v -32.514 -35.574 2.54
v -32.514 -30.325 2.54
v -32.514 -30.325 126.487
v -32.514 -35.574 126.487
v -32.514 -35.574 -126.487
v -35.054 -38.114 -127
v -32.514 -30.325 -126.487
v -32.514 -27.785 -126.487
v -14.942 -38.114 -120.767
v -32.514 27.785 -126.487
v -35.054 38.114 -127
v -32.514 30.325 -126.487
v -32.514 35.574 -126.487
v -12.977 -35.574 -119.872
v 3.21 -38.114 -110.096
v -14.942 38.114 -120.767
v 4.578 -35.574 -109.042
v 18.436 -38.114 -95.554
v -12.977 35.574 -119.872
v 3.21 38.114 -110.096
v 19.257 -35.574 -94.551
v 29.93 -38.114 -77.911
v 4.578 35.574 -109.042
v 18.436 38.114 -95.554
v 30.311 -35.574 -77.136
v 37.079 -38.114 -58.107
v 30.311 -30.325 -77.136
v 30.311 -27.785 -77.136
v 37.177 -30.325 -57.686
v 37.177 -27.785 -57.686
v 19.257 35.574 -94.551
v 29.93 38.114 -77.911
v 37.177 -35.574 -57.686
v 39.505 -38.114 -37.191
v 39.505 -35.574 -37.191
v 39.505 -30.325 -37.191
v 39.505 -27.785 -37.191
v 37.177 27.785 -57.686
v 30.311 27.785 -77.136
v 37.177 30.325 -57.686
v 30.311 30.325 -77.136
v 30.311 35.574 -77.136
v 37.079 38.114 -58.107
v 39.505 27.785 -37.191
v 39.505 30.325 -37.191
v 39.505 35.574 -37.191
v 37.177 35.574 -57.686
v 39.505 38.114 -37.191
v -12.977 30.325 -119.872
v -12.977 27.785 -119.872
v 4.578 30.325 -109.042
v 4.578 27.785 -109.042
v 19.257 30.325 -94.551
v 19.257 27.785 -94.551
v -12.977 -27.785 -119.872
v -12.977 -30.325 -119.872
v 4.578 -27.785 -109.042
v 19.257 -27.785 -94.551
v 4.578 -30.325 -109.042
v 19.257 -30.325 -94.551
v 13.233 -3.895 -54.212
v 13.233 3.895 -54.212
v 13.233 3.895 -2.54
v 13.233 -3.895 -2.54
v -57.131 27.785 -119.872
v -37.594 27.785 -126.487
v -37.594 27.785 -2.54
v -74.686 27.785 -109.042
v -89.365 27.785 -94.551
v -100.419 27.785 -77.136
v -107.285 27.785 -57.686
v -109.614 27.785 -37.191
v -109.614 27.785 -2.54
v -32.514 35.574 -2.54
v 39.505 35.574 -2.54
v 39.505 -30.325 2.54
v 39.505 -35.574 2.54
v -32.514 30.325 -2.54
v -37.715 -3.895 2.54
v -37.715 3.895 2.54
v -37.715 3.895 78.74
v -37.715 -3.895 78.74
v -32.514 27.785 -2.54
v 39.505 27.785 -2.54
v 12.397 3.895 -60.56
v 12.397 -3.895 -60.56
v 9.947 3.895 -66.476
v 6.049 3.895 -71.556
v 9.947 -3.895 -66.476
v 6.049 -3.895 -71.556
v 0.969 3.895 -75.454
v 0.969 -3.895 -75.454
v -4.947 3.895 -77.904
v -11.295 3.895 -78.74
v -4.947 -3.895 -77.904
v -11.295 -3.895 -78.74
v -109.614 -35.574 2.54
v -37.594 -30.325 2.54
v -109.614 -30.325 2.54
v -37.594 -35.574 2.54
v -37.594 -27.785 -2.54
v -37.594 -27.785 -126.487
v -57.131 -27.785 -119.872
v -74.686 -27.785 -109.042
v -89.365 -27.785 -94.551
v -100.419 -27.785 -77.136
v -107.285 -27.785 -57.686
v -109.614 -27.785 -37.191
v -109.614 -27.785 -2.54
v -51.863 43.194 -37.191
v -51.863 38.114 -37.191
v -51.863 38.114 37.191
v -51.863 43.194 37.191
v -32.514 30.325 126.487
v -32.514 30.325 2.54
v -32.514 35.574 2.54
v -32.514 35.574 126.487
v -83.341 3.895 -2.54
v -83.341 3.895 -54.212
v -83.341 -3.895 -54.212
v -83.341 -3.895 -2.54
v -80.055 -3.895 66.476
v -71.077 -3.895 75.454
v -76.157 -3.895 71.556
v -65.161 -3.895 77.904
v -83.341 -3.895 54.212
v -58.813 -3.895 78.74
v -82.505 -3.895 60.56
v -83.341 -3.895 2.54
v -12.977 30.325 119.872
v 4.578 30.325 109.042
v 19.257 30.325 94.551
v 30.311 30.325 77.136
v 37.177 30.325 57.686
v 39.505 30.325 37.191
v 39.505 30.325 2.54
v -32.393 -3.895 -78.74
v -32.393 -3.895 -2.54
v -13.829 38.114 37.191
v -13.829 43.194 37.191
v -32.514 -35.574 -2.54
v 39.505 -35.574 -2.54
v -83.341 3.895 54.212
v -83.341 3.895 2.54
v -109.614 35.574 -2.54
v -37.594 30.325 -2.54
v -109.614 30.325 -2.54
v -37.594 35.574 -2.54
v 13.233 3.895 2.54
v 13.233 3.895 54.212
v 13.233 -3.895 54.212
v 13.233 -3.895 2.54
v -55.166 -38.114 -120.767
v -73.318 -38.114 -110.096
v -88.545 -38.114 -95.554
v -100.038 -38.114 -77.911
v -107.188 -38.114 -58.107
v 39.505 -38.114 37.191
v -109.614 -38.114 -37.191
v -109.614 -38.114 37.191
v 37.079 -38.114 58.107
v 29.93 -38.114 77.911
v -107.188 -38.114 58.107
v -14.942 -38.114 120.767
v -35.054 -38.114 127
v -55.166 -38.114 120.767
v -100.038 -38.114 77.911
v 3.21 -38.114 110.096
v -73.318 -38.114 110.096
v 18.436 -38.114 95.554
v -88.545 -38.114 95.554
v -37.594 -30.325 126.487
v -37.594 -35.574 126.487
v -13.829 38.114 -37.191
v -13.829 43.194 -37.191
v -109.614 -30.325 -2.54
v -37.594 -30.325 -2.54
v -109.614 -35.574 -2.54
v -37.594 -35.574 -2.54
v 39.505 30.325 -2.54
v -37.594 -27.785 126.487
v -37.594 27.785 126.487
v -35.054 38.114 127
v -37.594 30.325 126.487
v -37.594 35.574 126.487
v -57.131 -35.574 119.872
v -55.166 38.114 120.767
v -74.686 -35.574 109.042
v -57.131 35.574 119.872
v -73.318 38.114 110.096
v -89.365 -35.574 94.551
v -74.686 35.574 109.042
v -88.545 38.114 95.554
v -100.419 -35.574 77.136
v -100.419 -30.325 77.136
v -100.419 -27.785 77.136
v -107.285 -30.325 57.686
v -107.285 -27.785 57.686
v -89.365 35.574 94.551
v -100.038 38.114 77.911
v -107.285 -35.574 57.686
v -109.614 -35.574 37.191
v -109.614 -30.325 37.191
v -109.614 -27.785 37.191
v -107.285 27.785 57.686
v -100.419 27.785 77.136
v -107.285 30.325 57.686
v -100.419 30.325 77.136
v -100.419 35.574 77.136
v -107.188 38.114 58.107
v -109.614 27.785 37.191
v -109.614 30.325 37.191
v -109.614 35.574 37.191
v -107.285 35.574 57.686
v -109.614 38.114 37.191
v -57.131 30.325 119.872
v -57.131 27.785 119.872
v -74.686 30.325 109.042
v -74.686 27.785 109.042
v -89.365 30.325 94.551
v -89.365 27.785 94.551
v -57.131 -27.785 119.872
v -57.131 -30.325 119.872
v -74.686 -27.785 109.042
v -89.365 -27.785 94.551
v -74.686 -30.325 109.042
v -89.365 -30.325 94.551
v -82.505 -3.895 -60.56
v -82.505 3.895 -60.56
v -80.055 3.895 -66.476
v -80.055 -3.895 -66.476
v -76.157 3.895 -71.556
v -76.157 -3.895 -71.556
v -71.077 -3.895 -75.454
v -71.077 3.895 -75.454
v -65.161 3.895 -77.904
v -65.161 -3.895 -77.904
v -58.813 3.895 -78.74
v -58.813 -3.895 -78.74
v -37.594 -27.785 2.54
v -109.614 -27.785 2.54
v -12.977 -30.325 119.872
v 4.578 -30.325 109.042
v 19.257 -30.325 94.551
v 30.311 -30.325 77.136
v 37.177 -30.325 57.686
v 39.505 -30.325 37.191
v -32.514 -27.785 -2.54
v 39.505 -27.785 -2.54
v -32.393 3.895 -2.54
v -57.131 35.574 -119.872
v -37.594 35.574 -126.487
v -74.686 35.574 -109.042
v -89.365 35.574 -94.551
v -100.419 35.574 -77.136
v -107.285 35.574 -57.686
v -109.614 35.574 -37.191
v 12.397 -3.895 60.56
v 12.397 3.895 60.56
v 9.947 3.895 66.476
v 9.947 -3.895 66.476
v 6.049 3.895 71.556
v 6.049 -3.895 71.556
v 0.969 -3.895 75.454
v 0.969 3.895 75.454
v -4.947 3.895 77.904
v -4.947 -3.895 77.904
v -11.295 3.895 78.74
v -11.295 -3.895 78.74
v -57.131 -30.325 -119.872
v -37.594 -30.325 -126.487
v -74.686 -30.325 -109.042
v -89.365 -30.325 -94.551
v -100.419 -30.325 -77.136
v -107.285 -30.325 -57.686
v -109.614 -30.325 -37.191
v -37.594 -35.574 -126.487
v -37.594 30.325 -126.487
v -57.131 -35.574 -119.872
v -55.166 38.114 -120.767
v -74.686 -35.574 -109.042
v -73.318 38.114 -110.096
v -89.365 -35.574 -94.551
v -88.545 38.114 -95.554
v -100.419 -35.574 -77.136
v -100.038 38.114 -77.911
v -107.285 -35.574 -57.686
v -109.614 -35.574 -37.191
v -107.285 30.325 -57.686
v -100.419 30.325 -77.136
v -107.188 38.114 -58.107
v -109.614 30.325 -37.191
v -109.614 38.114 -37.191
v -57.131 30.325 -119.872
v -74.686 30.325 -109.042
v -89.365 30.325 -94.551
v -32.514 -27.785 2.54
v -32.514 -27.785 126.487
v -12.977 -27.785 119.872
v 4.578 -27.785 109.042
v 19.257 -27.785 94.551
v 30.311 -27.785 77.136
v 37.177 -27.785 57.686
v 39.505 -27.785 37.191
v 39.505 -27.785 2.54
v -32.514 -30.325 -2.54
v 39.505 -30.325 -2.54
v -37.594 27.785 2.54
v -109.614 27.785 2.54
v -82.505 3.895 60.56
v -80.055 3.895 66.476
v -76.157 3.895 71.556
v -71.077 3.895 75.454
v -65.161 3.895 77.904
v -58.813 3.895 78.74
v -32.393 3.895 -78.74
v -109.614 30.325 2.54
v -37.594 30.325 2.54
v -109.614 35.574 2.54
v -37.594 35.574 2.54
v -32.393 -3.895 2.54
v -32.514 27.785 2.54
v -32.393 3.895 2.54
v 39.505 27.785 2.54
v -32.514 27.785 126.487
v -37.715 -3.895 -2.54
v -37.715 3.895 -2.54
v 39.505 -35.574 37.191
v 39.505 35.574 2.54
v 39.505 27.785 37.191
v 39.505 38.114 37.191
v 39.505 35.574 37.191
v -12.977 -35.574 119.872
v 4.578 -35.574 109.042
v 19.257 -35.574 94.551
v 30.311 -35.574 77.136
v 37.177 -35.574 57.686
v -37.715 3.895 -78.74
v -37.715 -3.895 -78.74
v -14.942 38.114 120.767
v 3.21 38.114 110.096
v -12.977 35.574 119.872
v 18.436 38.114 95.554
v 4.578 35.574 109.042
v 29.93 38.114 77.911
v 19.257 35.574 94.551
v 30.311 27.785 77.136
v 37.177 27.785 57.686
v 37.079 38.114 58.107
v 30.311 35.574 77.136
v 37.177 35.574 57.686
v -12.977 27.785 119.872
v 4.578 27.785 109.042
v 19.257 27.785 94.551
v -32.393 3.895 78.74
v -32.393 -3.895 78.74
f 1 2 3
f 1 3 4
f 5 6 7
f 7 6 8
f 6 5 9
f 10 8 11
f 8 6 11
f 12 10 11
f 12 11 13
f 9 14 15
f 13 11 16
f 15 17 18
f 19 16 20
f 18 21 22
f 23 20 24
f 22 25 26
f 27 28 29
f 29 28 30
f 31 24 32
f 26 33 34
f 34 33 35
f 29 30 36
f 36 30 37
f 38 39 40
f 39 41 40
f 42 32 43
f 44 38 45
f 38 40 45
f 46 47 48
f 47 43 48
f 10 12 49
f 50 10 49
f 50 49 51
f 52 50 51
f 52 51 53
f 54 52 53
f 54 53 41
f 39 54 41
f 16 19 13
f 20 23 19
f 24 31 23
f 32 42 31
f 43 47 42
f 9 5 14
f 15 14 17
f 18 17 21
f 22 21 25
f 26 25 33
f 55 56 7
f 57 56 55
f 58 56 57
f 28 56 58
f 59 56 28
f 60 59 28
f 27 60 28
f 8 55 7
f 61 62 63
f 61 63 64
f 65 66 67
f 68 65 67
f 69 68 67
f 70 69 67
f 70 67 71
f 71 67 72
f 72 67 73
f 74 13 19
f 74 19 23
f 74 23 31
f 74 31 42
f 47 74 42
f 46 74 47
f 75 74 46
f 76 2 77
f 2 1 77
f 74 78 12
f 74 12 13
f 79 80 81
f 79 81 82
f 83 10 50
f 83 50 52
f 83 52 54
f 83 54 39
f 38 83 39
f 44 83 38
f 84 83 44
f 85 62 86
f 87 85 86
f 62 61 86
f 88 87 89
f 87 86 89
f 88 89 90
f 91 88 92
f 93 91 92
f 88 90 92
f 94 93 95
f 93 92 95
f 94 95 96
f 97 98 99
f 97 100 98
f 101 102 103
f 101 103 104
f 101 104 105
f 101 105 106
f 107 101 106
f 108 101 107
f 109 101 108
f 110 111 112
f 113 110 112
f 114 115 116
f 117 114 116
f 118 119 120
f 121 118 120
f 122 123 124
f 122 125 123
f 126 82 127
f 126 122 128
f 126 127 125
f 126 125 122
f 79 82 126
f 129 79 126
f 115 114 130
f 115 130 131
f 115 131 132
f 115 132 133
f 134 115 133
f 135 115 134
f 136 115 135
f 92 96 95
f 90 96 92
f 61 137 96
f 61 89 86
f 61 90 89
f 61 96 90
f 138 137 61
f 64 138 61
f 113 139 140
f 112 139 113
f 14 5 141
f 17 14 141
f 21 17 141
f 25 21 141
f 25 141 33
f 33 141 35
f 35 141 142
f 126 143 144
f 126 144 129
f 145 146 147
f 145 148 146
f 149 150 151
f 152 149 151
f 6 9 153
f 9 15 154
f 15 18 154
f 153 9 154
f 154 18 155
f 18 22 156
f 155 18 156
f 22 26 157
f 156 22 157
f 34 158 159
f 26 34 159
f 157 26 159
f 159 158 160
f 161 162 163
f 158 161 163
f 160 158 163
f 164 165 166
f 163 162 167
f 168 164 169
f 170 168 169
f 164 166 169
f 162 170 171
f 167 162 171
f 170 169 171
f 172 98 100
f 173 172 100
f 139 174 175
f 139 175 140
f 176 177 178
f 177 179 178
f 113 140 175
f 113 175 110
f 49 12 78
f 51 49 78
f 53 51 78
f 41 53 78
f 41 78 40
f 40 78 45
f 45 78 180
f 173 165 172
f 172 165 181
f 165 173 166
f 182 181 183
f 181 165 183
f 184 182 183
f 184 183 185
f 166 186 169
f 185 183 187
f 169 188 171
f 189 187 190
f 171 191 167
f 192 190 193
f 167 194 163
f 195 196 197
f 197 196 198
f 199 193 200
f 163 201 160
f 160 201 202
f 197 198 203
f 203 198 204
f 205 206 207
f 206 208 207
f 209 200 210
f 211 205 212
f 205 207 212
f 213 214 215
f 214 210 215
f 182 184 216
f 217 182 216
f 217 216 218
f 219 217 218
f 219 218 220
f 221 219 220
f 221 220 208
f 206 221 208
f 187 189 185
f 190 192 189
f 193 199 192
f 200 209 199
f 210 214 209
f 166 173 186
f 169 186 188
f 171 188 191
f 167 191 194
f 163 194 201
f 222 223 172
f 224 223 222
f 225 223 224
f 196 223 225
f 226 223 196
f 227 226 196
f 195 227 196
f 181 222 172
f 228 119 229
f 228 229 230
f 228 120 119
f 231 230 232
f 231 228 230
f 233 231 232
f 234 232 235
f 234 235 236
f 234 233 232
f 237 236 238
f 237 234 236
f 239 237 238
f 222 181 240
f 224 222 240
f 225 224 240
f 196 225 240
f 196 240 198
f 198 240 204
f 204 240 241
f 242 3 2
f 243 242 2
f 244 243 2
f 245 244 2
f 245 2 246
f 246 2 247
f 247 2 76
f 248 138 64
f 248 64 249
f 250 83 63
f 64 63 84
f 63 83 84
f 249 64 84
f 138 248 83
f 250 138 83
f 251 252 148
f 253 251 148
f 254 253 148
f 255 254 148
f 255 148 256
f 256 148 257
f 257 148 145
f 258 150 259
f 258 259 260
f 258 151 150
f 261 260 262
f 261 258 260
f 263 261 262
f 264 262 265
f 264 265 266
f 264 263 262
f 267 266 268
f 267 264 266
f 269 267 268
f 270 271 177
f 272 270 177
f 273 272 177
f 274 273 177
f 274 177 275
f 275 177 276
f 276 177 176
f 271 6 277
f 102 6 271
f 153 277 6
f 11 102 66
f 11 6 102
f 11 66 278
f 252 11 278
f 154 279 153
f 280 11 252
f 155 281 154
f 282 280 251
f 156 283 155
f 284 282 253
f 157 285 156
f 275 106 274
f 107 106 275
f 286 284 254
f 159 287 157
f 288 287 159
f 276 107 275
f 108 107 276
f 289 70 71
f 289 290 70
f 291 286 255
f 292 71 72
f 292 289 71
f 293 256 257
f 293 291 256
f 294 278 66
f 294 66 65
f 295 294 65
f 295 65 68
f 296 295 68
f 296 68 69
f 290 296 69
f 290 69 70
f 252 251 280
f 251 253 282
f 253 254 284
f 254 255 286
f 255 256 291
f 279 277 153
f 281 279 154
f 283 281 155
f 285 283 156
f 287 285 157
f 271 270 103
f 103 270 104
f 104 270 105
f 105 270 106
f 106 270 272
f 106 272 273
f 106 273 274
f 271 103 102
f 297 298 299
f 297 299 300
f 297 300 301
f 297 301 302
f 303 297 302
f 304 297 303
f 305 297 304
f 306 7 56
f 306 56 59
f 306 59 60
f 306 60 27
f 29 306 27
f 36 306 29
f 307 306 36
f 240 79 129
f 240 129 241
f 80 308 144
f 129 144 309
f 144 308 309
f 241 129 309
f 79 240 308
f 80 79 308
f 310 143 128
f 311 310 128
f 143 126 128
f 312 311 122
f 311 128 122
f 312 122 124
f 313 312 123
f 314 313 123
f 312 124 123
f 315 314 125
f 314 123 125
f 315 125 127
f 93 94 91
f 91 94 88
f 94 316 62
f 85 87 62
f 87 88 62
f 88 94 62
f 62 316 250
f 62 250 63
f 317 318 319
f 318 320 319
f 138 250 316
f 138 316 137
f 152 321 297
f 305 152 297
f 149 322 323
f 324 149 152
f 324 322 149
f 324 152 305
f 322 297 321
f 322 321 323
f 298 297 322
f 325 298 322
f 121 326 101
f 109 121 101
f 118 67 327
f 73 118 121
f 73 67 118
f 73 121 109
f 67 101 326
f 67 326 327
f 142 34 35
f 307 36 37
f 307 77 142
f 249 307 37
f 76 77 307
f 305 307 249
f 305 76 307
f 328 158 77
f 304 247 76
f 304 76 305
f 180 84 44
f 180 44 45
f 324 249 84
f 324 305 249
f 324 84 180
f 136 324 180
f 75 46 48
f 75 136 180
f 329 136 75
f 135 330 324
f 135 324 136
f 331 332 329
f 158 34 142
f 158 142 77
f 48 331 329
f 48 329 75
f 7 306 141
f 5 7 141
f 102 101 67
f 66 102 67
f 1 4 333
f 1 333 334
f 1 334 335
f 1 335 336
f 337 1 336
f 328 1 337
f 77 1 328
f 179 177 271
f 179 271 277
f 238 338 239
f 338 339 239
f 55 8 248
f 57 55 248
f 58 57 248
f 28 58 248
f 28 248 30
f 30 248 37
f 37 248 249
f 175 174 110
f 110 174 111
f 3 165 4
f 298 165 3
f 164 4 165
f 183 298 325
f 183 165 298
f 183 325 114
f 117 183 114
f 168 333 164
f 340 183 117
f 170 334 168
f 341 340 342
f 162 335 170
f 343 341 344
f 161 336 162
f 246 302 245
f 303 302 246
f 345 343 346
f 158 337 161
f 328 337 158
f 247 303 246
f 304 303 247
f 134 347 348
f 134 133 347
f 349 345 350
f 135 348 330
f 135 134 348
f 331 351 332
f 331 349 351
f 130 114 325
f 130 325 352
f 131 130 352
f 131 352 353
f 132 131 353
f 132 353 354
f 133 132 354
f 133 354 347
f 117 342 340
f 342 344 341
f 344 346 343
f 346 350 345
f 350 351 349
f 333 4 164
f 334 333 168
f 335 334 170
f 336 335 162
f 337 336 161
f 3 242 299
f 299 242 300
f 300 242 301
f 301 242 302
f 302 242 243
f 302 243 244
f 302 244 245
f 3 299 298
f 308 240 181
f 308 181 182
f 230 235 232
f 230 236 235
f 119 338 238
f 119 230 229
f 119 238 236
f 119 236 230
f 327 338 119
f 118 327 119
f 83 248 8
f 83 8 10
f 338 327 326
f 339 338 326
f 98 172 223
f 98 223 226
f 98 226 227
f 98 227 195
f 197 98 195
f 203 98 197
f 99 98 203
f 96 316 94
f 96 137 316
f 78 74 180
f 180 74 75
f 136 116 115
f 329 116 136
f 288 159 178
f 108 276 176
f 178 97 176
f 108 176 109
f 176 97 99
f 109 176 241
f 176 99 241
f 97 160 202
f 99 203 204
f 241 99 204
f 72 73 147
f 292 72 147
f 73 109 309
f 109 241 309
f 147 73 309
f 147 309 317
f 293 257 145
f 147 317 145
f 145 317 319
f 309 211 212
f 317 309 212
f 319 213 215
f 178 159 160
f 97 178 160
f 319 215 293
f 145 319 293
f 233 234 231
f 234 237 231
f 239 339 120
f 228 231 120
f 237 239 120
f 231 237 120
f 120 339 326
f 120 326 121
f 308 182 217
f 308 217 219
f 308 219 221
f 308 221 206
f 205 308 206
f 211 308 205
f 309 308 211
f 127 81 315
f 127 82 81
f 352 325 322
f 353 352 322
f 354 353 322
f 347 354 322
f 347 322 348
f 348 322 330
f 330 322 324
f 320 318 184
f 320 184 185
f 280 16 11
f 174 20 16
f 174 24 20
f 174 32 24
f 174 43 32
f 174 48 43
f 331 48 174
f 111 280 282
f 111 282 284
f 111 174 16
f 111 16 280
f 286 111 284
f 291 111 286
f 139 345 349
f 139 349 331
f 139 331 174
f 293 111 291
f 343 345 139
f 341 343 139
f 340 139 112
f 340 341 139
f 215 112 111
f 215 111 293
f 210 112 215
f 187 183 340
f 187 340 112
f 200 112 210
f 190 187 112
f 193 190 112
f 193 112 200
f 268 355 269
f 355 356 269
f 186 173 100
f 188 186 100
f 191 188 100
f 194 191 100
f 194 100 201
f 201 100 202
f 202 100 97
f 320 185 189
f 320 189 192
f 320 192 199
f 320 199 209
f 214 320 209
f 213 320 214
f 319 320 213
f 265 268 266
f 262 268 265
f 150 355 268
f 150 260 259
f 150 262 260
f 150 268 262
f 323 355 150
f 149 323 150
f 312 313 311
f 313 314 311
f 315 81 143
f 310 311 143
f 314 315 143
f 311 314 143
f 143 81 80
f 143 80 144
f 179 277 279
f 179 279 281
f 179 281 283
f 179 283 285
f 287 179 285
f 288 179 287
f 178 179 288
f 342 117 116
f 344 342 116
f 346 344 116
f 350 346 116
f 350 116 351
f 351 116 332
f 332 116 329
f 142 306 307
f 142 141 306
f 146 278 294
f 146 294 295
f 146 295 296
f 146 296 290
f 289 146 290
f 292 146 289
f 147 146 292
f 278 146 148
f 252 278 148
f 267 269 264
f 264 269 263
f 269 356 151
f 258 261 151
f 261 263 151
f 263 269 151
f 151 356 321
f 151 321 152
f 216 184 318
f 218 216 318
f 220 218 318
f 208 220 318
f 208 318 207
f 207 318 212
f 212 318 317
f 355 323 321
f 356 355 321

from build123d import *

# Parameters (mm, degrees)
F0_W        = 74.5595730841
F0_H        = 68.4390123934
F1_DEPTH    = 127
F2_T        = -2.54
F3_T1_DEPTH = 451.5844547388
F3_T3_DEPTH = 451.5844547388
F6_W        = 45.6260088831
F6_H        = 7.7898120508
F7_DEPTH    = 76.2
F8_R        = 24.5284097937
F11_W       = 38.0337639379
F11_H       = 74.3822181045
F12_DEPTH   = 5.08


# Not quite as in the source:
# - a fillet or chamfer that OpenCascade refuses, or shapes differently, is made with other operations: its cross-section is extruded or revolved along the edge and cut away or added
# - the program builds the solid bodies; features that only make, move or delete a surface that nothing else refers to are left out


with BuildPart() as f1:
    # F0 (on Top) → F1 (new body)
    with BuildSketch(Plane.XY):
        with Locations((2.225657925, 3.8948999718)):
            Rectangle(F0_W, F0_H)
    extrude(amount=F1_DEPTH)

    # F2
    f2_openings = [f1.faces().sort_by_distance(p)[0] for p in [
        (2.225658, 3.8949, 127),
        (39.505444, 3.8949, 63.5),
    ]]
    offset(amount=F2_T, openings=f2_openings)

    # F3: fillet of radius 91.3683264816 on 2 edges, made by hand

    # F3_s2 → F3_t1 (cut)
    with BuildSketch(Plane.XZ.offset(-196.7376211445)):
        with BuildLine():
            ThreePointArc((-35.054128617, 127), (18.4363311824, 95.5536973082), (39.5054444671, 37.1911090522))
            Line((39.5054444671, 37.1911090522), (39.5054444671, 127))
            Line((39.5054444671, 127), (-35.054128617, 127))
        make_face()
    extrude(amount=F3_T1_DEPTH, mode=Mode.SUBTRACT)

    # F3_s4 → F3_t3 (cut)
    with BuildSketch(Plane.XZ.offset(-262.6366335379)):
        with BuildLine():
            ThreePointArc((-35.054128617, 127), (18.4363311824, 95.5536973082), (39.5054444671, 37.1911090522))
            Line((39.5054444671, 37.1911090522), (39.5054444671, 127))
            Line((39.5054444671, 127), (-35.054128617, 127))
        make_face()
    extrude(amount=F3_T3_DEPTH, mode=Mode.SUBTRACT)

    # F4: F1 across plane


with BuildPart() as f1_1:
    add(f1.part)
    add(f1.part.mirror(Plane.XZ))

    # F5: F1 across plane


with BuildPart() as f1_2:
    add(f1_1.part)
    add(f1_1.part.mirror(Plane.XY))

    # F6 (on face) → F7 (join)
    with BuildSketch(Plane(origin=(0, 0, -2.54), x_dir=(1, 0, 0), z_dir=(0, 0, -1))):
        with Locations((-9.5800887793, 0)):
            Rectangle(F6_W, F6_H)
    extrude(amount=F7_DEPTH)

    # F8
    f8_edges = [f1_2.edges().sort_by_distance(p)[0] for p in [
        (13.232916, 0, -78.74),
    ]]
    fillet(f8_edges, radius=F8_R)

    # F9: F1 across plane


with BuildPart() as f1_3:
    add(f1_2.part)
    add(f1_2.part.mirror(Plane.XY))

    # F10: F1 across face


with BuildPart() as f1_4:
    add(f1_3.part)
    add(f1_3.part.mirror(Plane(origin=(-35.054128617, 0, 0), x_dir=(0, -1, 0), z_dir=(-1, 0, 0))))

    # F11 (on face) → F12 (join)
    with BuildSketch(Plane(origin=(0, 38.1144061685, 0), x_dir=(-1, 0, 0), z_dir=(0, 1, 0))):
        with Locations((32.8460000455, 0)):
            Rectangle(F11_W, F11_H)
    extrude(amount=F12_DEPTH)


solid = f1_4.part
